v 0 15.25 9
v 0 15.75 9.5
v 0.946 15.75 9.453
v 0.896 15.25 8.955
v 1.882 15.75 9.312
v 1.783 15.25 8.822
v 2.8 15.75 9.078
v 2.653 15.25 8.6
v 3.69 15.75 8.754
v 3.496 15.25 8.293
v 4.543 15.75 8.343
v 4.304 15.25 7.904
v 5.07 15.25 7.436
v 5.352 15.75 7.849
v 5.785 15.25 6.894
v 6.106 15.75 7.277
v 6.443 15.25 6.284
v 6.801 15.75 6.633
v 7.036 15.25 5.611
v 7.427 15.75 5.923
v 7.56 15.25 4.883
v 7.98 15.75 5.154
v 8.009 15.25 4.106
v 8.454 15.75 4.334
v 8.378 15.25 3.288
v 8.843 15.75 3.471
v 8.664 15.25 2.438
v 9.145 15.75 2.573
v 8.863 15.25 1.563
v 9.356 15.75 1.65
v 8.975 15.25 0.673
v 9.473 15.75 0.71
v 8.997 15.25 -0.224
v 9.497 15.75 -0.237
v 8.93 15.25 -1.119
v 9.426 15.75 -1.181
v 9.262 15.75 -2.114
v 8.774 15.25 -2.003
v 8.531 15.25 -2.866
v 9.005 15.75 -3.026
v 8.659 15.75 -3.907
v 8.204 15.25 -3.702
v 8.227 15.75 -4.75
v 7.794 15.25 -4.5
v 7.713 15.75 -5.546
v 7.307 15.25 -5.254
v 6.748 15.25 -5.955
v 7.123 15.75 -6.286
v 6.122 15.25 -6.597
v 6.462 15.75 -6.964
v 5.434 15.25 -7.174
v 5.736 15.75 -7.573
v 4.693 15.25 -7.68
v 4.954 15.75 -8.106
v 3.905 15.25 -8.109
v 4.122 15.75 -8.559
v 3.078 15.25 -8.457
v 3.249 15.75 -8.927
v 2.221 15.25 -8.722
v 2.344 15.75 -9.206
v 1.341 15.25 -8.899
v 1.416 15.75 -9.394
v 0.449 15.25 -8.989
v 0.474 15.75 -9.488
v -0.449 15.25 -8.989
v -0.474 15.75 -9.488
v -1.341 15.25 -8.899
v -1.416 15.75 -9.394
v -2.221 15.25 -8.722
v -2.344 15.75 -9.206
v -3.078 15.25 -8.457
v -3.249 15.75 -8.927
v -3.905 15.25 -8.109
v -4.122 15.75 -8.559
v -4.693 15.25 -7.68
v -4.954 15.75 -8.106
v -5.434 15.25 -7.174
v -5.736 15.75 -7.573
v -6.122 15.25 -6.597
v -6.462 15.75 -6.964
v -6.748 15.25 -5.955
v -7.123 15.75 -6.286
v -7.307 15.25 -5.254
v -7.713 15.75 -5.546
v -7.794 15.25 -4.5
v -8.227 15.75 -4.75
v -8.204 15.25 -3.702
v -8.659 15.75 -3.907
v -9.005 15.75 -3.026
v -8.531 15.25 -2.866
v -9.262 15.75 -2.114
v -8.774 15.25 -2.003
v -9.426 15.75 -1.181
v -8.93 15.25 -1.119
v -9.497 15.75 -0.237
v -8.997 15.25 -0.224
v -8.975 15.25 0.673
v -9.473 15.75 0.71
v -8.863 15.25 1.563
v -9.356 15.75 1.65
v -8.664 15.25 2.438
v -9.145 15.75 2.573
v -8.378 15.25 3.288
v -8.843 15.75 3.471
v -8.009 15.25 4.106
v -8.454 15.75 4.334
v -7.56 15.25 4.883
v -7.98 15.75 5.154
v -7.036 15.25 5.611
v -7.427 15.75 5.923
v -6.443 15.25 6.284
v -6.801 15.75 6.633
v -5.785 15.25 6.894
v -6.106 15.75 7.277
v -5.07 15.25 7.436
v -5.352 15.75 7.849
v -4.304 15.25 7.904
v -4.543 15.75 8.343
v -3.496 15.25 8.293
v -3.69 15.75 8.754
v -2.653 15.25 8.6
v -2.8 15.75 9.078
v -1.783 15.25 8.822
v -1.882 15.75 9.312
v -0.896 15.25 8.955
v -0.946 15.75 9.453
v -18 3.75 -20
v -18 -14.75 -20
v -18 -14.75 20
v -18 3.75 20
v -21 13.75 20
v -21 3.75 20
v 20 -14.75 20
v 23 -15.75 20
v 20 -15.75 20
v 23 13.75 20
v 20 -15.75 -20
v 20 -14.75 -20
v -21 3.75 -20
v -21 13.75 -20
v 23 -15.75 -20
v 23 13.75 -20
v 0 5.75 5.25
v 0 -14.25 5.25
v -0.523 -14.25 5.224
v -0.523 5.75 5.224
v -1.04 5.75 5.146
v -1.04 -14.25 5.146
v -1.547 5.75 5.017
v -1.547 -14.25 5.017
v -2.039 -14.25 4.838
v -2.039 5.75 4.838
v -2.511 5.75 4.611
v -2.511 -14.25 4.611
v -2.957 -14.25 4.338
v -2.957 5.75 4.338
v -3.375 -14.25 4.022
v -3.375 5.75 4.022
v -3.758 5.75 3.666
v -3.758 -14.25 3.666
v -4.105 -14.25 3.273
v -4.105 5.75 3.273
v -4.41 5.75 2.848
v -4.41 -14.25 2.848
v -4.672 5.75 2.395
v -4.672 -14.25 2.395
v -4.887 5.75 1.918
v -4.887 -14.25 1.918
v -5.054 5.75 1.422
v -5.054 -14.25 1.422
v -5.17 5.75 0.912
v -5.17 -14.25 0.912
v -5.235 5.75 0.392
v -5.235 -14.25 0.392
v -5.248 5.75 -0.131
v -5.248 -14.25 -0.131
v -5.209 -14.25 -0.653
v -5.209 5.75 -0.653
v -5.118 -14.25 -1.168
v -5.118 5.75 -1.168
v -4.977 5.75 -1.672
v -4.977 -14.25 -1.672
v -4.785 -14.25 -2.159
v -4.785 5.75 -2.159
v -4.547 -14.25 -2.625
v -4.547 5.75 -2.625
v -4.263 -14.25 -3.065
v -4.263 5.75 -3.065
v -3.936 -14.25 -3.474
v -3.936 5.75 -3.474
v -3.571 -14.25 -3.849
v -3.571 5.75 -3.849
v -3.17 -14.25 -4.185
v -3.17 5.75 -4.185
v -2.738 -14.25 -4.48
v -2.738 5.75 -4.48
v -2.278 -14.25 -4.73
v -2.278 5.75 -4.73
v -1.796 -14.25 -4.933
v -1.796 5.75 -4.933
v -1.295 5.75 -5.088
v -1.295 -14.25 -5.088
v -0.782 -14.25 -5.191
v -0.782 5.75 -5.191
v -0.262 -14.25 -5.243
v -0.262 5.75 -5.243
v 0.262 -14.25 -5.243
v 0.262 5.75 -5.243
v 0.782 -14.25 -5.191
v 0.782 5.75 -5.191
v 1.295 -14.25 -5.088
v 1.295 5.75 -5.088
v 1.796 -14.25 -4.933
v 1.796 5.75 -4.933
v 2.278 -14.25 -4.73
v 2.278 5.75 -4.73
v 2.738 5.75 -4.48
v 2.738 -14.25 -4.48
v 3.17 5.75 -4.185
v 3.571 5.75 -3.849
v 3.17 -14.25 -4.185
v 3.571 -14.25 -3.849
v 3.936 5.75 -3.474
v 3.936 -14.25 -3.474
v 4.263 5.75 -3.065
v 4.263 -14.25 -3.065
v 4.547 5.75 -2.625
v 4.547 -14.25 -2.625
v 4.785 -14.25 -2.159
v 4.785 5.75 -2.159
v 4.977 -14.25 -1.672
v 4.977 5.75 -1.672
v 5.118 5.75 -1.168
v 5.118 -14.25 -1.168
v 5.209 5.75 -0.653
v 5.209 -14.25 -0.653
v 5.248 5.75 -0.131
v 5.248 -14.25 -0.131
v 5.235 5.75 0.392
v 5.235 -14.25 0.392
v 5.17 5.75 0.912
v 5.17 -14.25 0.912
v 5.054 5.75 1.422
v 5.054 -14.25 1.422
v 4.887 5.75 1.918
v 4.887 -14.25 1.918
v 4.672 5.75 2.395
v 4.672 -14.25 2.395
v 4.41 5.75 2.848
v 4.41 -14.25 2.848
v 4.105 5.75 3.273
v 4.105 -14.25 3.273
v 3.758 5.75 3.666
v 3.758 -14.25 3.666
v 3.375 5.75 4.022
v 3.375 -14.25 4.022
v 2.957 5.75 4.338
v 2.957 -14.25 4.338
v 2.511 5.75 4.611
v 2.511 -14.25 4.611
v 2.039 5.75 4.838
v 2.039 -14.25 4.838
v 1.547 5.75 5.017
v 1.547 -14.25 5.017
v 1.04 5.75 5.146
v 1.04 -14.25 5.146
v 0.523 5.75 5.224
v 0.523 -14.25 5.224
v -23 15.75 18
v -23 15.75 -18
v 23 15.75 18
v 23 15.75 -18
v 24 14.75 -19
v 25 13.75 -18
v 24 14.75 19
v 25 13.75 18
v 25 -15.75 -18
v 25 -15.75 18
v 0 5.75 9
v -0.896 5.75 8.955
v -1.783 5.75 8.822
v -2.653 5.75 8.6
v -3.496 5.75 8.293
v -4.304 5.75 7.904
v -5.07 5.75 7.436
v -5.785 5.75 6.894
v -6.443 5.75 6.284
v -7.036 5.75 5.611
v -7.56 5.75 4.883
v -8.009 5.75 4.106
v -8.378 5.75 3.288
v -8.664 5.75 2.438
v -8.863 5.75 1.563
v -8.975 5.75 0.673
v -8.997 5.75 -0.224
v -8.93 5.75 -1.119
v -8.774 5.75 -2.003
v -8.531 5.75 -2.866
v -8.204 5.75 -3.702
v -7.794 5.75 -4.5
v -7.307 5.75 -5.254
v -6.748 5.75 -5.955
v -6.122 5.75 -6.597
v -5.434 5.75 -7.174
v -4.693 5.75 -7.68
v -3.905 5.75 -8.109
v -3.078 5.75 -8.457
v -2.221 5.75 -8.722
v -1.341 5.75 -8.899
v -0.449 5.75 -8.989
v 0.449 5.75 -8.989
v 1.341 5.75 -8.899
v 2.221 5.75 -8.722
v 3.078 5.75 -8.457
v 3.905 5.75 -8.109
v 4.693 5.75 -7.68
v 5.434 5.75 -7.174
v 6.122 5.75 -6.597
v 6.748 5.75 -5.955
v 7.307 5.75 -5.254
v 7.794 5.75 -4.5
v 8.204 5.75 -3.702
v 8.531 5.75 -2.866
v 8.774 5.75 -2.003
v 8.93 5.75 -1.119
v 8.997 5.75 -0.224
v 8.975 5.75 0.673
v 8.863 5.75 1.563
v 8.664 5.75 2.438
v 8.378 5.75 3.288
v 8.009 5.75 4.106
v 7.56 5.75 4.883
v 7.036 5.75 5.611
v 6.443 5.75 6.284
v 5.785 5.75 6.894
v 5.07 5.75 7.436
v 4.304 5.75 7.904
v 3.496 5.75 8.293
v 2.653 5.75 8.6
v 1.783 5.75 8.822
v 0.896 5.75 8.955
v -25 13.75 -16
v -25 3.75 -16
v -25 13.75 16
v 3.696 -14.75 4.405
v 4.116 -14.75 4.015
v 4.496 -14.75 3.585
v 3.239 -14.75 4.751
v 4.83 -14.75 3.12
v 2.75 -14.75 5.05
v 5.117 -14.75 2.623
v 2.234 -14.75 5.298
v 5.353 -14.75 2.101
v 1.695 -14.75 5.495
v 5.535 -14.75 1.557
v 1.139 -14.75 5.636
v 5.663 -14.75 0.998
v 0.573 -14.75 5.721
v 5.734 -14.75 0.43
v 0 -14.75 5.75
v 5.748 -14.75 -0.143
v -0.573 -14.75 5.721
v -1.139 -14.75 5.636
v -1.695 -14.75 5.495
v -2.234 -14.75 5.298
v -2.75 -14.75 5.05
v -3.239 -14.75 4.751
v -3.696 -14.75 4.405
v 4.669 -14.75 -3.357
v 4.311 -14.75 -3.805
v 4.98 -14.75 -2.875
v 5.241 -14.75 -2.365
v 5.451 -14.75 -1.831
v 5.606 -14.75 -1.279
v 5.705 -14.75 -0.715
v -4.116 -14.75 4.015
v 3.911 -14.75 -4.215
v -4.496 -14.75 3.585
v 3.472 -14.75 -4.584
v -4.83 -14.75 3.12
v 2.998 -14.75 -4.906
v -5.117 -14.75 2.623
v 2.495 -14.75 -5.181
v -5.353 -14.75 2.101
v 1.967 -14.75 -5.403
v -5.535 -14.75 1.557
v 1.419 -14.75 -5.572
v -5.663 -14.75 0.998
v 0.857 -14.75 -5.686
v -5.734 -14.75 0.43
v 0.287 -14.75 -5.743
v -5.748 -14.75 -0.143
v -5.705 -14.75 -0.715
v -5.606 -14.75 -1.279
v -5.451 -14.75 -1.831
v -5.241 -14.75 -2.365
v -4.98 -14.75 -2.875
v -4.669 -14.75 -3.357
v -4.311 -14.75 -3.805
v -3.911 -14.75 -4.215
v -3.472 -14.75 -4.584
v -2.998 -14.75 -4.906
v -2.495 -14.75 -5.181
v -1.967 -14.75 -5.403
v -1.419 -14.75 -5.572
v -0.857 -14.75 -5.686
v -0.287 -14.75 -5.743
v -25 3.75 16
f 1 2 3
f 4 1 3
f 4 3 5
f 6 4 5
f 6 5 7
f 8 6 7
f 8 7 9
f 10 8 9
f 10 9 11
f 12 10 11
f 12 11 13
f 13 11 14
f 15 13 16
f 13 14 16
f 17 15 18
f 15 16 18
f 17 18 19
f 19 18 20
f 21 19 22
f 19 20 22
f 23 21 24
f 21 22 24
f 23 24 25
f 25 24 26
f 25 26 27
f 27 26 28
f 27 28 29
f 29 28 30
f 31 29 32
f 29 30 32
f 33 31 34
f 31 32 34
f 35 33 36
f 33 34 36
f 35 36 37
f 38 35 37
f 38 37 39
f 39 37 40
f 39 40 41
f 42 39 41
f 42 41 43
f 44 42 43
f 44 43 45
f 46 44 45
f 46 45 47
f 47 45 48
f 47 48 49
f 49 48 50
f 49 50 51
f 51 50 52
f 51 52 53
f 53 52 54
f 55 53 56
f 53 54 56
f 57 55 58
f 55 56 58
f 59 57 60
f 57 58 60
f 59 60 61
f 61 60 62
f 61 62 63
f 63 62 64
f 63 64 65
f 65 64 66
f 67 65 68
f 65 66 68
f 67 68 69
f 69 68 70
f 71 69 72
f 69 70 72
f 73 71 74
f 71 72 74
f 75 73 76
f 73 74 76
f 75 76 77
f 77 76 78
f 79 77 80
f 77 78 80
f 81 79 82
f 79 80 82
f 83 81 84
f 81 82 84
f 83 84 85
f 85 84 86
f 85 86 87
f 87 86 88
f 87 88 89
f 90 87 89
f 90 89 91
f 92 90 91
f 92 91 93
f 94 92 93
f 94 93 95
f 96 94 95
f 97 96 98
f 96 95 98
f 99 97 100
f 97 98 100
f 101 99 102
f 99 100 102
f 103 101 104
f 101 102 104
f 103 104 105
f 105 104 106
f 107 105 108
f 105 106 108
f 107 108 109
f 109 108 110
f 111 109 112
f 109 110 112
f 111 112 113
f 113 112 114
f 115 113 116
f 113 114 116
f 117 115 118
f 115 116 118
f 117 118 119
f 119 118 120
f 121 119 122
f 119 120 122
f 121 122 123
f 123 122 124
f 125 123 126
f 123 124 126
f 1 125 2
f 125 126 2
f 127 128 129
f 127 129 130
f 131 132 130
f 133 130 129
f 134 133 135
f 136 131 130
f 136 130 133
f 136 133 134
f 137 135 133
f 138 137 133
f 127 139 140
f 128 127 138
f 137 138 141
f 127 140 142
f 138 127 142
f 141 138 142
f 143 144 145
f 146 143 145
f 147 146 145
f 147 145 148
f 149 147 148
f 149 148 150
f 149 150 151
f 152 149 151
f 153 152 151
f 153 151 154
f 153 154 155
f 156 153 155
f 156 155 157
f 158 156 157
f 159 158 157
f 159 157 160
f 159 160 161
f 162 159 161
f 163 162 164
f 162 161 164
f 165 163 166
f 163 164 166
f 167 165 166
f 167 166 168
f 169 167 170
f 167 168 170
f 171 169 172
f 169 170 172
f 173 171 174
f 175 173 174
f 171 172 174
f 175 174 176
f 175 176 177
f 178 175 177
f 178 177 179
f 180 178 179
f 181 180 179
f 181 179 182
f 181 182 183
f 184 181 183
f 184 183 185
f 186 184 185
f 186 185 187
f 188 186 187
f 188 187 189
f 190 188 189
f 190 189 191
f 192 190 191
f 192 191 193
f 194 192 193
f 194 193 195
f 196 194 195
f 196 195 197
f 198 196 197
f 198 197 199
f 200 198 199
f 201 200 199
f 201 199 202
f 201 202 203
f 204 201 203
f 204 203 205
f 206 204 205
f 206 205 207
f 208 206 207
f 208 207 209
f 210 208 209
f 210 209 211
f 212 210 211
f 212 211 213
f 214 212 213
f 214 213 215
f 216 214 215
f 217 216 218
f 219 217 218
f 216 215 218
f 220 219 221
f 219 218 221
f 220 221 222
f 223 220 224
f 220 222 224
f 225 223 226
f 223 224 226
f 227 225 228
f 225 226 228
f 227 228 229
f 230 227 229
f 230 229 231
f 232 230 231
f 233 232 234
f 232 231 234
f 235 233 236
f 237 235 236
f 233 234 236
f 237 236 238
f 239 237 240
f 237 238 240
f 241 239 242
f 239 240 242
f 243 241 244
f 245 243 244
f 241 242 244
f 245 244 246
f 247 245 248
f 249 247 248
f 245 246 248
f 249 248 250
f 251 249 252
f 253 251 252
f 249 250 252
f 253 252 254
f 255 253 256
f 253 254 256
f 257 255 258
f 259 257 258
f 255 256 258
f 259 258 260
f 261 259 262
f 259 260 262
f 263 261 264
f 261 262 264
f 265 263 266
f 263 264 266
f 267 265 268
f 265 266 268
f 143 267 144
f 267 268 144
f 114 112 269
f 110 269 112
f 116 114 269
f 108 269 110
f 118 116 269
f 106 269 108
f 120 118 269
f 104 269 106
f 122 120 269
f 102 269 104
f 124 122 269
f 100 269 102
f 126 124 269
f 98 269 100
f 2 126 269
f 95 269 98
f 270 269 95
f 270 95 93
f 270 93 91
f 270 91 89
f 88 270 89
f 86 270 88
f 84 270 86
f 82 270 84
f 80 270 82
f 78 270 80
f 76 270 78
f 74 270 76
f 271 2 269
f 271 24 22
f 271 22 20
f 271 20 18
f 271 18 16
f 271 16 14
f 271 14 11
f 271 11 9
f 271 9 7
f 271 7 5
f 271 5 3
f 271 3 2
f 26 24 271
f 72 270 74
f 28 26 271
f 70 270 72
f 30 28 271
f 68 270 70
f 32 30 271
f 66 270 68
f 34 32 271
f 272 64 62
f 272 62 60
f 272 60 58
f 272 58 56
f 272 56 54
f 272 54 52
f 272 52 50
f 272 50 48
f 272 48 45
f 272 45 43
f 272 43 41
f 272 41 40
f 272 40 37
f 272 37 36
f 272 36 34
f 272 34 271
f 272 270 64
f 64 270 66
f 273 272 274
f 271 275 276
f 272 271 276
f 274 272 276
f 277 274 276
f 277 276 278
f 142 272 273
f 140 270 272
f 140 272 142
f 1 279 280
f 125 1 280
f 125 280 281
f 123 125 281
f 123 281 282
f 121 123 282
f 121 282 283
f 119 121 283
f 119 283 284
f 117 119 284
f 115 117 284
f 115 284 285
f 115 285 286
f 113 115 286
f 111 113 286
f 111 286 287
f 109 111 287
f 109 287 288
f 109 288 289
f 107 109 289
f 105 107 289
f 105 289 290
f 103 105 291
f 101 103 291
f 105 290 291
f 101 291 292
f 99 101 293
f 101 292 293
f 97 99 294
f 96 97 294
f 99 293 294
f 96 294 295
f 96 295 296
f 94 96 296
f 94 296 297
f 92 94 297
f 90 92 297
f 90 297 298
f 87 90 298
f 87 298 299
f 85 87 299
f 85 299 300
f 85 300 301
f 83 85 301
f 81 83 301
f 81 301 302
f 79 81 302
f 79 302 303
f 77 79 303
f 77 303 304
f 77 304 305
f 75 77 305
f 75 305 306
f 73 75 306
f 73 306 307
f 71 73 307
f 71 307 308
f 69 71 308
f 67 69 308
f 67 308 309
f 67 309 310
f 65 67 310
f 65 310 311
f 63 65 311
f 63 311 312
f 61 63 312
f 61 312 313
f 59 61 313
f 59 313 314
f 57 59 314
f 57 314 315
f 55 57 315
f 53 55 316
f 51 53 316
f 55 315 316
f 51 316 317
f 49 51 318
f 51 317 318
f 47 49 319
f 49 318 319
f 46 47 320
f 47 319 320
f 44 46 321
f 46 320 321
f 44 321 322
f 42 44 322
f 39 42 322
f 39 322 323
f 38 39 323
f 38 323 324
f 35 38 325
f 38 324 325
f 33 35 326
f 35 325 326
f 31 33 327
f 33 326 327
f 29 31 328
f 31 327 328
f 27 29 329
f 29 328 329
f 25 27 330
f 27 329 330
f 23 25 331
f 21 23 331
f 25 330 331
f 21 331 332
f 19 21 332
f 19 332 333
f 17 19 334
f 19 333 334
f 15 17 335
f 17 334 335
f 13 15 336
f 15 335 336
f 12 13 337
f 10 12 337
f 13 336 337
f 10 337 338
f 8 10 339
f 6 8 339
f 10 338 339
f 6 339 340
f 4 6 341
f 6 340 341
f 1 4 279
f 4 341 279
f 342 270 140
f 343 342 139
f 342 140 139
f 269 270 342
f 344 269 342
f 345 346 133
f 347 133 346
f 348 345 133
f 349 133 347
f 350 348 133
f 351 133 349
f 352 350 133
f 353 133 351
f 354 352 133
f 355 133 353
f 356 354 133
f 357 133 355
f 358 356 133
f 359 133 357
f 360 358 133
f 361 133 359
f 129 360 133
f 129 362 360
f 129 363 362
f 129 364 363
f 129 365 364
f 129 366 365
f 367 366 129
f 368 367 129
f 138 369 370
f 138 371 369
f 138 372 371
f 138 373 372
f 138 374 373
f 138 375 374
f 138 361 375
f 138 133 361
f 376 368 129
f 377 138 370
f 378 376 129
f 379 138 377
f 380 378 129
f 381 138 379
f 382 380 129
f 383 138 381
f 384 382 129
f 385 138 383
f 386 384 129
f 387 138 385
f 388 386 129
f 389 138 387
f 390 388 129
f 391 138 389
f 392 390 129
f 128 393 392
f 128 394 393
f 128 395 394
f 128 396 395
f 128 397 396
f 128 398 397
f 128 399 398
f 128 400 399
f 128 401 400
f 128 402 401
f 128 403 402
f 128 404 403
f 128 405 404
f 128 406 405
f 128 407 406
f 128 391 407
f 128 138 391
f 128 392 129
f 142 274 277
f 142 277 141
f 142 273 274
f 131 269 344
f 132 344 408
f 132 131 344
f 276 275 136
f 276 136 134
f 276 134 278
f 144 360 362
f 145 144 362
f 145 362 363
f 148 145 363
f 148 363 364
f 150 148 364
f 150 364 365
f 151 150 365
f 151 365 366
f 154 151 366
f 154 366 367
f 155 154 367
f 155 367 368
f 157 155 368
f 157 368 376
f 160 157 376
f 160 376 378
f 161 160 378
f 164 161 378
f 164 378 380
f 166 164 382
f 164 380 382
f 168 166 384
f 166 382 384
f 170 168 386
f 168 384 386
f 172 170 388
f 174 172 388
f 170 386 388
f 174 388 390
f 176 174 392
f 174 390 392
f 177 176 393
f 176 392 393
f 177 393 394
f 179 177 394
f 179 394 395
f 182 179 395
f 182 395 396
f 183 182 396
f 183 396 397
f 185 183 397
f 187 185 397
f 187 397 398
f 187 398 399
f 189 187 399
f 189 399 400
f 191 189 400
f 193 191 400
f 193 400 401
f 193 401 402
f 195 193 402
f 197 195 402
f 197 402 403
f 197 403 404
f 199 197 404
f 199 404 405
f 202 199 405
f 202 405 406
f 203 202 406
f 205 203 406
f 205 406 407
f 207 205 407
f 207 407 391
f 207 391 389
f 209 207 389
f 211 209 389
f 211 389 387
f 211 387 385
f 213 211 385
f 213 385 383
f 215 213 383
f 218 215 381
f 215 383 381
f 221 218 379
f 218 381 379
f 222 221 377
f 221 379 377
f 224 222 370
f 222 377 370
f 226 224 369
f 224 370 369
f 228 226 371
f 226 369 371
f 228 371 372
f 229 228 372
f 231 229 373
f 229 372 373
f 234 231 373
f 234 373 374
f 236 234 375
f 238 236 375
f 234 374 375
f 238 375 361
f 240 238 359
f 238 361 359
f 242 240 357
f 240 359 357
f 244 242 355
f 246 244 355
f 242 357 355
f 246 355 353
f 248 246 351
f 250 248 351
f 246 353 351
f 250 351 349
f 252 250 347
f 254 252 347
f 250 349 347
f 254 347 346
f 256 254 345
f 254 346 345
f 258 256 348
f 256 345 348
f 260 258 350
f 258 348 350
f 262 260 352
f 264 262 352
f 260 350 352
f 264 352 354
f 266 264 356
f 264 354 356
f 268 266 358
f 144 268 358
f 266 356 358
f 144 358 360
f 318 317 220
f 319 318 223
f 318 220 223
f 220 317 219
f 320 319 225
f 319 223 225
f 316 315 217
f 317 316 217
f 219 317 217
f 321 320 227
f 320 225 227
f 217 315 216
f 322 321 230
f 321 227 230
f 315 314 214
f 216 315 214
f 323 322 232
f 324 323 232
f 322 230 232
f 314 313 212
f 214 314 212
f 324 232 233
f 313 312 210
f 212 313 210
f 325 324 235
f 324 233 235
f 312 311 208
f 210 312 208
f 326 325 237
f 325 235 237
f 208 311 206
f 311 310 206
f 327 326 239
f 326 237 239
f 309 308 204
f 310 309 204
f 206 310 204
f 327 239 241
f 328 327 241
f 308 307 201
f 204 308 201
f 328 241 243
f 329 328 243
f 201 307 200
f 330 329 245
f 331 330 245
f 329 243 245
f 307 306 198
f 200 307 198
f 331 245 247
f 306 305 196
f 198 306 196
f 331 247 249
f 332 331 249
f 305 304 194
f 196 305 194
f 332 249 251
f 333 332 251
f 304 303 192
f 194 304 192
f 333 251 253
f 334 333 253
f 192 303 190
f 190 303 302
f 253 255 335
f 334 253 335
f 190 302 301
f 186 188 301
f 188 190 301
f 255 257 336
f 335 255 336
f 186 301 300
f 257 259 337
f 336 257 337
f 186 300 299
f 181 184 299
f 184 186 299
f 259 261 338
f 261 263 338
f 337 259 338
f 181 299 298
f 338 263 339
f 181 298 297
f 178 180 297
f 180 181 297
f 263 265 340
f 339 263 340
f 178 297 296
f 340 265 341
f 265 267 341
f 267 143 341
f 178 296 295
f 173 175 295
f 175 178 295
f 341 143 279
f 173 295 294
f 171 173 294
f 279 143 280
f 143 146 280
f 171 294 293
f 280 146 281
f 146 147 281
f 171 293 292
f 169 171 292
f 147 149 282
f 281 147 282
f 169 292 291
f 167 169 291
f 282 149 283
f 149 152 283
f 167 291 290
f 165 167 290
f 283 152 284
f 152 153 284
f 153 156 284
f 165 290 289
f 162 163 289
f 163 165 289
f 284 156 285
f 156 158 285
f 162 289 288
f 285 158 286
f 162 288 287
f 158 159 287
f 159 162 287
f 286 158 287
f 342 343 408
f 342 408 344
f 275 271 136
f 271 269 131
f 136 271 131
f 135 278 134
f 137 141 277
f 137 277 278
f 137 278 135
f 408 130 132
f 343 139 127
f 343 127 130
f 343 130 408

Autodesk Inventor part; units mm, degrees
ref_plane "YZ Plane" through (0, 0, 0) normal (1, 0, 0) x (0, 1, 0)
ref_plane "XZ Plane" through (0, 0, 0) normal (0, 1, 0) x (-1, 0, 0)
ref_plane "XY Plane" through (0, 0, 0) normal (0, 0, 1) x (1, 0, 0)
sketch "Sketch1" plane through (0, 0, 0) normal (0, 0, 1) x (1, 0, 0)
  line L0 (-25, 15.75) -> (25, 15.75)
  line L1 (25, 15.75) -> (25, -15.75)
  line L2 (25, -15.75) -> (20, -15.75)
  line L3 (20, -15.75) -> (20, -14.75)
  line L4 (20, -14.75) -> (-18, -14.75)
  line L5 (-18, -14.75) -> (-18, 3.75)
  line L6 (-18, 3.75) -> (-25, 3.75)
  line L7 (-25, 3.75) -> (-25, 15.75)
  line L8 (-35, 0) -> (35, 0) construction
  line L9 (0, -22.05) -> (0, 22.05) construction
  point P0 (0, 0)
  dimension "d0" = 50
  dimension "d1" = 31.5
  dimension "d2" = 1
  dimension "d3" = 7
  dimension "d5" = 5
  dimension "d24" = 12
  dimension "d25" = 19.5
extrude "Extrusion1" add sketch "Sketch1" along normal mid plane 40
sketch "Sketch2" plane through (-25, 15.75, 20) normal (0, 1, 0) x (1, 0, 0)
  line L0 (45, 40) -> (45, 0) construction
  line L1 (7, 0) -> (45, 0) construction
  line L2 (7, 40) -> (7, 0) construction
  line L3 (45, 40) -> (7, 40) construction
  line L4 (0, 40) -> (50, 40) projected
  line L5 (25, 40) -> (25, 0)
  line L6 (50, 0) -> (0, 0) projected
  point P0 (25, 20)
  point P1 (25, 20)
  dimension "d23" = 18
  dimension "d26" = 38
hole "Hole1" at (0, 15.75, 0) direction (0, -1, 0) diameter 10.5 end through all counterbore diameter 18 counterbore depth 10
chamfer "Chamfer1" distance 2 angle 45 6 edges at (-25, 15.75, 0) (0, 15.75, 20) (0, 15.75, -20) (25, 15.75, 0) (25, 0, 20) (25, 0, -20)
chamfer "Chamfer2" distance 4 angle 45 2 edges at (-25, 8.75, 20) (-25, 8.75, -20)
chamfer "Chamfer3" distance 0.5 angle 45 1 edges at (0, -14.75, -5.25)
chamfer "Chamfer4" distance 0.5 angle 45 1 edges at (0, 15.75, -9)
properties part number "VTC1-001"
